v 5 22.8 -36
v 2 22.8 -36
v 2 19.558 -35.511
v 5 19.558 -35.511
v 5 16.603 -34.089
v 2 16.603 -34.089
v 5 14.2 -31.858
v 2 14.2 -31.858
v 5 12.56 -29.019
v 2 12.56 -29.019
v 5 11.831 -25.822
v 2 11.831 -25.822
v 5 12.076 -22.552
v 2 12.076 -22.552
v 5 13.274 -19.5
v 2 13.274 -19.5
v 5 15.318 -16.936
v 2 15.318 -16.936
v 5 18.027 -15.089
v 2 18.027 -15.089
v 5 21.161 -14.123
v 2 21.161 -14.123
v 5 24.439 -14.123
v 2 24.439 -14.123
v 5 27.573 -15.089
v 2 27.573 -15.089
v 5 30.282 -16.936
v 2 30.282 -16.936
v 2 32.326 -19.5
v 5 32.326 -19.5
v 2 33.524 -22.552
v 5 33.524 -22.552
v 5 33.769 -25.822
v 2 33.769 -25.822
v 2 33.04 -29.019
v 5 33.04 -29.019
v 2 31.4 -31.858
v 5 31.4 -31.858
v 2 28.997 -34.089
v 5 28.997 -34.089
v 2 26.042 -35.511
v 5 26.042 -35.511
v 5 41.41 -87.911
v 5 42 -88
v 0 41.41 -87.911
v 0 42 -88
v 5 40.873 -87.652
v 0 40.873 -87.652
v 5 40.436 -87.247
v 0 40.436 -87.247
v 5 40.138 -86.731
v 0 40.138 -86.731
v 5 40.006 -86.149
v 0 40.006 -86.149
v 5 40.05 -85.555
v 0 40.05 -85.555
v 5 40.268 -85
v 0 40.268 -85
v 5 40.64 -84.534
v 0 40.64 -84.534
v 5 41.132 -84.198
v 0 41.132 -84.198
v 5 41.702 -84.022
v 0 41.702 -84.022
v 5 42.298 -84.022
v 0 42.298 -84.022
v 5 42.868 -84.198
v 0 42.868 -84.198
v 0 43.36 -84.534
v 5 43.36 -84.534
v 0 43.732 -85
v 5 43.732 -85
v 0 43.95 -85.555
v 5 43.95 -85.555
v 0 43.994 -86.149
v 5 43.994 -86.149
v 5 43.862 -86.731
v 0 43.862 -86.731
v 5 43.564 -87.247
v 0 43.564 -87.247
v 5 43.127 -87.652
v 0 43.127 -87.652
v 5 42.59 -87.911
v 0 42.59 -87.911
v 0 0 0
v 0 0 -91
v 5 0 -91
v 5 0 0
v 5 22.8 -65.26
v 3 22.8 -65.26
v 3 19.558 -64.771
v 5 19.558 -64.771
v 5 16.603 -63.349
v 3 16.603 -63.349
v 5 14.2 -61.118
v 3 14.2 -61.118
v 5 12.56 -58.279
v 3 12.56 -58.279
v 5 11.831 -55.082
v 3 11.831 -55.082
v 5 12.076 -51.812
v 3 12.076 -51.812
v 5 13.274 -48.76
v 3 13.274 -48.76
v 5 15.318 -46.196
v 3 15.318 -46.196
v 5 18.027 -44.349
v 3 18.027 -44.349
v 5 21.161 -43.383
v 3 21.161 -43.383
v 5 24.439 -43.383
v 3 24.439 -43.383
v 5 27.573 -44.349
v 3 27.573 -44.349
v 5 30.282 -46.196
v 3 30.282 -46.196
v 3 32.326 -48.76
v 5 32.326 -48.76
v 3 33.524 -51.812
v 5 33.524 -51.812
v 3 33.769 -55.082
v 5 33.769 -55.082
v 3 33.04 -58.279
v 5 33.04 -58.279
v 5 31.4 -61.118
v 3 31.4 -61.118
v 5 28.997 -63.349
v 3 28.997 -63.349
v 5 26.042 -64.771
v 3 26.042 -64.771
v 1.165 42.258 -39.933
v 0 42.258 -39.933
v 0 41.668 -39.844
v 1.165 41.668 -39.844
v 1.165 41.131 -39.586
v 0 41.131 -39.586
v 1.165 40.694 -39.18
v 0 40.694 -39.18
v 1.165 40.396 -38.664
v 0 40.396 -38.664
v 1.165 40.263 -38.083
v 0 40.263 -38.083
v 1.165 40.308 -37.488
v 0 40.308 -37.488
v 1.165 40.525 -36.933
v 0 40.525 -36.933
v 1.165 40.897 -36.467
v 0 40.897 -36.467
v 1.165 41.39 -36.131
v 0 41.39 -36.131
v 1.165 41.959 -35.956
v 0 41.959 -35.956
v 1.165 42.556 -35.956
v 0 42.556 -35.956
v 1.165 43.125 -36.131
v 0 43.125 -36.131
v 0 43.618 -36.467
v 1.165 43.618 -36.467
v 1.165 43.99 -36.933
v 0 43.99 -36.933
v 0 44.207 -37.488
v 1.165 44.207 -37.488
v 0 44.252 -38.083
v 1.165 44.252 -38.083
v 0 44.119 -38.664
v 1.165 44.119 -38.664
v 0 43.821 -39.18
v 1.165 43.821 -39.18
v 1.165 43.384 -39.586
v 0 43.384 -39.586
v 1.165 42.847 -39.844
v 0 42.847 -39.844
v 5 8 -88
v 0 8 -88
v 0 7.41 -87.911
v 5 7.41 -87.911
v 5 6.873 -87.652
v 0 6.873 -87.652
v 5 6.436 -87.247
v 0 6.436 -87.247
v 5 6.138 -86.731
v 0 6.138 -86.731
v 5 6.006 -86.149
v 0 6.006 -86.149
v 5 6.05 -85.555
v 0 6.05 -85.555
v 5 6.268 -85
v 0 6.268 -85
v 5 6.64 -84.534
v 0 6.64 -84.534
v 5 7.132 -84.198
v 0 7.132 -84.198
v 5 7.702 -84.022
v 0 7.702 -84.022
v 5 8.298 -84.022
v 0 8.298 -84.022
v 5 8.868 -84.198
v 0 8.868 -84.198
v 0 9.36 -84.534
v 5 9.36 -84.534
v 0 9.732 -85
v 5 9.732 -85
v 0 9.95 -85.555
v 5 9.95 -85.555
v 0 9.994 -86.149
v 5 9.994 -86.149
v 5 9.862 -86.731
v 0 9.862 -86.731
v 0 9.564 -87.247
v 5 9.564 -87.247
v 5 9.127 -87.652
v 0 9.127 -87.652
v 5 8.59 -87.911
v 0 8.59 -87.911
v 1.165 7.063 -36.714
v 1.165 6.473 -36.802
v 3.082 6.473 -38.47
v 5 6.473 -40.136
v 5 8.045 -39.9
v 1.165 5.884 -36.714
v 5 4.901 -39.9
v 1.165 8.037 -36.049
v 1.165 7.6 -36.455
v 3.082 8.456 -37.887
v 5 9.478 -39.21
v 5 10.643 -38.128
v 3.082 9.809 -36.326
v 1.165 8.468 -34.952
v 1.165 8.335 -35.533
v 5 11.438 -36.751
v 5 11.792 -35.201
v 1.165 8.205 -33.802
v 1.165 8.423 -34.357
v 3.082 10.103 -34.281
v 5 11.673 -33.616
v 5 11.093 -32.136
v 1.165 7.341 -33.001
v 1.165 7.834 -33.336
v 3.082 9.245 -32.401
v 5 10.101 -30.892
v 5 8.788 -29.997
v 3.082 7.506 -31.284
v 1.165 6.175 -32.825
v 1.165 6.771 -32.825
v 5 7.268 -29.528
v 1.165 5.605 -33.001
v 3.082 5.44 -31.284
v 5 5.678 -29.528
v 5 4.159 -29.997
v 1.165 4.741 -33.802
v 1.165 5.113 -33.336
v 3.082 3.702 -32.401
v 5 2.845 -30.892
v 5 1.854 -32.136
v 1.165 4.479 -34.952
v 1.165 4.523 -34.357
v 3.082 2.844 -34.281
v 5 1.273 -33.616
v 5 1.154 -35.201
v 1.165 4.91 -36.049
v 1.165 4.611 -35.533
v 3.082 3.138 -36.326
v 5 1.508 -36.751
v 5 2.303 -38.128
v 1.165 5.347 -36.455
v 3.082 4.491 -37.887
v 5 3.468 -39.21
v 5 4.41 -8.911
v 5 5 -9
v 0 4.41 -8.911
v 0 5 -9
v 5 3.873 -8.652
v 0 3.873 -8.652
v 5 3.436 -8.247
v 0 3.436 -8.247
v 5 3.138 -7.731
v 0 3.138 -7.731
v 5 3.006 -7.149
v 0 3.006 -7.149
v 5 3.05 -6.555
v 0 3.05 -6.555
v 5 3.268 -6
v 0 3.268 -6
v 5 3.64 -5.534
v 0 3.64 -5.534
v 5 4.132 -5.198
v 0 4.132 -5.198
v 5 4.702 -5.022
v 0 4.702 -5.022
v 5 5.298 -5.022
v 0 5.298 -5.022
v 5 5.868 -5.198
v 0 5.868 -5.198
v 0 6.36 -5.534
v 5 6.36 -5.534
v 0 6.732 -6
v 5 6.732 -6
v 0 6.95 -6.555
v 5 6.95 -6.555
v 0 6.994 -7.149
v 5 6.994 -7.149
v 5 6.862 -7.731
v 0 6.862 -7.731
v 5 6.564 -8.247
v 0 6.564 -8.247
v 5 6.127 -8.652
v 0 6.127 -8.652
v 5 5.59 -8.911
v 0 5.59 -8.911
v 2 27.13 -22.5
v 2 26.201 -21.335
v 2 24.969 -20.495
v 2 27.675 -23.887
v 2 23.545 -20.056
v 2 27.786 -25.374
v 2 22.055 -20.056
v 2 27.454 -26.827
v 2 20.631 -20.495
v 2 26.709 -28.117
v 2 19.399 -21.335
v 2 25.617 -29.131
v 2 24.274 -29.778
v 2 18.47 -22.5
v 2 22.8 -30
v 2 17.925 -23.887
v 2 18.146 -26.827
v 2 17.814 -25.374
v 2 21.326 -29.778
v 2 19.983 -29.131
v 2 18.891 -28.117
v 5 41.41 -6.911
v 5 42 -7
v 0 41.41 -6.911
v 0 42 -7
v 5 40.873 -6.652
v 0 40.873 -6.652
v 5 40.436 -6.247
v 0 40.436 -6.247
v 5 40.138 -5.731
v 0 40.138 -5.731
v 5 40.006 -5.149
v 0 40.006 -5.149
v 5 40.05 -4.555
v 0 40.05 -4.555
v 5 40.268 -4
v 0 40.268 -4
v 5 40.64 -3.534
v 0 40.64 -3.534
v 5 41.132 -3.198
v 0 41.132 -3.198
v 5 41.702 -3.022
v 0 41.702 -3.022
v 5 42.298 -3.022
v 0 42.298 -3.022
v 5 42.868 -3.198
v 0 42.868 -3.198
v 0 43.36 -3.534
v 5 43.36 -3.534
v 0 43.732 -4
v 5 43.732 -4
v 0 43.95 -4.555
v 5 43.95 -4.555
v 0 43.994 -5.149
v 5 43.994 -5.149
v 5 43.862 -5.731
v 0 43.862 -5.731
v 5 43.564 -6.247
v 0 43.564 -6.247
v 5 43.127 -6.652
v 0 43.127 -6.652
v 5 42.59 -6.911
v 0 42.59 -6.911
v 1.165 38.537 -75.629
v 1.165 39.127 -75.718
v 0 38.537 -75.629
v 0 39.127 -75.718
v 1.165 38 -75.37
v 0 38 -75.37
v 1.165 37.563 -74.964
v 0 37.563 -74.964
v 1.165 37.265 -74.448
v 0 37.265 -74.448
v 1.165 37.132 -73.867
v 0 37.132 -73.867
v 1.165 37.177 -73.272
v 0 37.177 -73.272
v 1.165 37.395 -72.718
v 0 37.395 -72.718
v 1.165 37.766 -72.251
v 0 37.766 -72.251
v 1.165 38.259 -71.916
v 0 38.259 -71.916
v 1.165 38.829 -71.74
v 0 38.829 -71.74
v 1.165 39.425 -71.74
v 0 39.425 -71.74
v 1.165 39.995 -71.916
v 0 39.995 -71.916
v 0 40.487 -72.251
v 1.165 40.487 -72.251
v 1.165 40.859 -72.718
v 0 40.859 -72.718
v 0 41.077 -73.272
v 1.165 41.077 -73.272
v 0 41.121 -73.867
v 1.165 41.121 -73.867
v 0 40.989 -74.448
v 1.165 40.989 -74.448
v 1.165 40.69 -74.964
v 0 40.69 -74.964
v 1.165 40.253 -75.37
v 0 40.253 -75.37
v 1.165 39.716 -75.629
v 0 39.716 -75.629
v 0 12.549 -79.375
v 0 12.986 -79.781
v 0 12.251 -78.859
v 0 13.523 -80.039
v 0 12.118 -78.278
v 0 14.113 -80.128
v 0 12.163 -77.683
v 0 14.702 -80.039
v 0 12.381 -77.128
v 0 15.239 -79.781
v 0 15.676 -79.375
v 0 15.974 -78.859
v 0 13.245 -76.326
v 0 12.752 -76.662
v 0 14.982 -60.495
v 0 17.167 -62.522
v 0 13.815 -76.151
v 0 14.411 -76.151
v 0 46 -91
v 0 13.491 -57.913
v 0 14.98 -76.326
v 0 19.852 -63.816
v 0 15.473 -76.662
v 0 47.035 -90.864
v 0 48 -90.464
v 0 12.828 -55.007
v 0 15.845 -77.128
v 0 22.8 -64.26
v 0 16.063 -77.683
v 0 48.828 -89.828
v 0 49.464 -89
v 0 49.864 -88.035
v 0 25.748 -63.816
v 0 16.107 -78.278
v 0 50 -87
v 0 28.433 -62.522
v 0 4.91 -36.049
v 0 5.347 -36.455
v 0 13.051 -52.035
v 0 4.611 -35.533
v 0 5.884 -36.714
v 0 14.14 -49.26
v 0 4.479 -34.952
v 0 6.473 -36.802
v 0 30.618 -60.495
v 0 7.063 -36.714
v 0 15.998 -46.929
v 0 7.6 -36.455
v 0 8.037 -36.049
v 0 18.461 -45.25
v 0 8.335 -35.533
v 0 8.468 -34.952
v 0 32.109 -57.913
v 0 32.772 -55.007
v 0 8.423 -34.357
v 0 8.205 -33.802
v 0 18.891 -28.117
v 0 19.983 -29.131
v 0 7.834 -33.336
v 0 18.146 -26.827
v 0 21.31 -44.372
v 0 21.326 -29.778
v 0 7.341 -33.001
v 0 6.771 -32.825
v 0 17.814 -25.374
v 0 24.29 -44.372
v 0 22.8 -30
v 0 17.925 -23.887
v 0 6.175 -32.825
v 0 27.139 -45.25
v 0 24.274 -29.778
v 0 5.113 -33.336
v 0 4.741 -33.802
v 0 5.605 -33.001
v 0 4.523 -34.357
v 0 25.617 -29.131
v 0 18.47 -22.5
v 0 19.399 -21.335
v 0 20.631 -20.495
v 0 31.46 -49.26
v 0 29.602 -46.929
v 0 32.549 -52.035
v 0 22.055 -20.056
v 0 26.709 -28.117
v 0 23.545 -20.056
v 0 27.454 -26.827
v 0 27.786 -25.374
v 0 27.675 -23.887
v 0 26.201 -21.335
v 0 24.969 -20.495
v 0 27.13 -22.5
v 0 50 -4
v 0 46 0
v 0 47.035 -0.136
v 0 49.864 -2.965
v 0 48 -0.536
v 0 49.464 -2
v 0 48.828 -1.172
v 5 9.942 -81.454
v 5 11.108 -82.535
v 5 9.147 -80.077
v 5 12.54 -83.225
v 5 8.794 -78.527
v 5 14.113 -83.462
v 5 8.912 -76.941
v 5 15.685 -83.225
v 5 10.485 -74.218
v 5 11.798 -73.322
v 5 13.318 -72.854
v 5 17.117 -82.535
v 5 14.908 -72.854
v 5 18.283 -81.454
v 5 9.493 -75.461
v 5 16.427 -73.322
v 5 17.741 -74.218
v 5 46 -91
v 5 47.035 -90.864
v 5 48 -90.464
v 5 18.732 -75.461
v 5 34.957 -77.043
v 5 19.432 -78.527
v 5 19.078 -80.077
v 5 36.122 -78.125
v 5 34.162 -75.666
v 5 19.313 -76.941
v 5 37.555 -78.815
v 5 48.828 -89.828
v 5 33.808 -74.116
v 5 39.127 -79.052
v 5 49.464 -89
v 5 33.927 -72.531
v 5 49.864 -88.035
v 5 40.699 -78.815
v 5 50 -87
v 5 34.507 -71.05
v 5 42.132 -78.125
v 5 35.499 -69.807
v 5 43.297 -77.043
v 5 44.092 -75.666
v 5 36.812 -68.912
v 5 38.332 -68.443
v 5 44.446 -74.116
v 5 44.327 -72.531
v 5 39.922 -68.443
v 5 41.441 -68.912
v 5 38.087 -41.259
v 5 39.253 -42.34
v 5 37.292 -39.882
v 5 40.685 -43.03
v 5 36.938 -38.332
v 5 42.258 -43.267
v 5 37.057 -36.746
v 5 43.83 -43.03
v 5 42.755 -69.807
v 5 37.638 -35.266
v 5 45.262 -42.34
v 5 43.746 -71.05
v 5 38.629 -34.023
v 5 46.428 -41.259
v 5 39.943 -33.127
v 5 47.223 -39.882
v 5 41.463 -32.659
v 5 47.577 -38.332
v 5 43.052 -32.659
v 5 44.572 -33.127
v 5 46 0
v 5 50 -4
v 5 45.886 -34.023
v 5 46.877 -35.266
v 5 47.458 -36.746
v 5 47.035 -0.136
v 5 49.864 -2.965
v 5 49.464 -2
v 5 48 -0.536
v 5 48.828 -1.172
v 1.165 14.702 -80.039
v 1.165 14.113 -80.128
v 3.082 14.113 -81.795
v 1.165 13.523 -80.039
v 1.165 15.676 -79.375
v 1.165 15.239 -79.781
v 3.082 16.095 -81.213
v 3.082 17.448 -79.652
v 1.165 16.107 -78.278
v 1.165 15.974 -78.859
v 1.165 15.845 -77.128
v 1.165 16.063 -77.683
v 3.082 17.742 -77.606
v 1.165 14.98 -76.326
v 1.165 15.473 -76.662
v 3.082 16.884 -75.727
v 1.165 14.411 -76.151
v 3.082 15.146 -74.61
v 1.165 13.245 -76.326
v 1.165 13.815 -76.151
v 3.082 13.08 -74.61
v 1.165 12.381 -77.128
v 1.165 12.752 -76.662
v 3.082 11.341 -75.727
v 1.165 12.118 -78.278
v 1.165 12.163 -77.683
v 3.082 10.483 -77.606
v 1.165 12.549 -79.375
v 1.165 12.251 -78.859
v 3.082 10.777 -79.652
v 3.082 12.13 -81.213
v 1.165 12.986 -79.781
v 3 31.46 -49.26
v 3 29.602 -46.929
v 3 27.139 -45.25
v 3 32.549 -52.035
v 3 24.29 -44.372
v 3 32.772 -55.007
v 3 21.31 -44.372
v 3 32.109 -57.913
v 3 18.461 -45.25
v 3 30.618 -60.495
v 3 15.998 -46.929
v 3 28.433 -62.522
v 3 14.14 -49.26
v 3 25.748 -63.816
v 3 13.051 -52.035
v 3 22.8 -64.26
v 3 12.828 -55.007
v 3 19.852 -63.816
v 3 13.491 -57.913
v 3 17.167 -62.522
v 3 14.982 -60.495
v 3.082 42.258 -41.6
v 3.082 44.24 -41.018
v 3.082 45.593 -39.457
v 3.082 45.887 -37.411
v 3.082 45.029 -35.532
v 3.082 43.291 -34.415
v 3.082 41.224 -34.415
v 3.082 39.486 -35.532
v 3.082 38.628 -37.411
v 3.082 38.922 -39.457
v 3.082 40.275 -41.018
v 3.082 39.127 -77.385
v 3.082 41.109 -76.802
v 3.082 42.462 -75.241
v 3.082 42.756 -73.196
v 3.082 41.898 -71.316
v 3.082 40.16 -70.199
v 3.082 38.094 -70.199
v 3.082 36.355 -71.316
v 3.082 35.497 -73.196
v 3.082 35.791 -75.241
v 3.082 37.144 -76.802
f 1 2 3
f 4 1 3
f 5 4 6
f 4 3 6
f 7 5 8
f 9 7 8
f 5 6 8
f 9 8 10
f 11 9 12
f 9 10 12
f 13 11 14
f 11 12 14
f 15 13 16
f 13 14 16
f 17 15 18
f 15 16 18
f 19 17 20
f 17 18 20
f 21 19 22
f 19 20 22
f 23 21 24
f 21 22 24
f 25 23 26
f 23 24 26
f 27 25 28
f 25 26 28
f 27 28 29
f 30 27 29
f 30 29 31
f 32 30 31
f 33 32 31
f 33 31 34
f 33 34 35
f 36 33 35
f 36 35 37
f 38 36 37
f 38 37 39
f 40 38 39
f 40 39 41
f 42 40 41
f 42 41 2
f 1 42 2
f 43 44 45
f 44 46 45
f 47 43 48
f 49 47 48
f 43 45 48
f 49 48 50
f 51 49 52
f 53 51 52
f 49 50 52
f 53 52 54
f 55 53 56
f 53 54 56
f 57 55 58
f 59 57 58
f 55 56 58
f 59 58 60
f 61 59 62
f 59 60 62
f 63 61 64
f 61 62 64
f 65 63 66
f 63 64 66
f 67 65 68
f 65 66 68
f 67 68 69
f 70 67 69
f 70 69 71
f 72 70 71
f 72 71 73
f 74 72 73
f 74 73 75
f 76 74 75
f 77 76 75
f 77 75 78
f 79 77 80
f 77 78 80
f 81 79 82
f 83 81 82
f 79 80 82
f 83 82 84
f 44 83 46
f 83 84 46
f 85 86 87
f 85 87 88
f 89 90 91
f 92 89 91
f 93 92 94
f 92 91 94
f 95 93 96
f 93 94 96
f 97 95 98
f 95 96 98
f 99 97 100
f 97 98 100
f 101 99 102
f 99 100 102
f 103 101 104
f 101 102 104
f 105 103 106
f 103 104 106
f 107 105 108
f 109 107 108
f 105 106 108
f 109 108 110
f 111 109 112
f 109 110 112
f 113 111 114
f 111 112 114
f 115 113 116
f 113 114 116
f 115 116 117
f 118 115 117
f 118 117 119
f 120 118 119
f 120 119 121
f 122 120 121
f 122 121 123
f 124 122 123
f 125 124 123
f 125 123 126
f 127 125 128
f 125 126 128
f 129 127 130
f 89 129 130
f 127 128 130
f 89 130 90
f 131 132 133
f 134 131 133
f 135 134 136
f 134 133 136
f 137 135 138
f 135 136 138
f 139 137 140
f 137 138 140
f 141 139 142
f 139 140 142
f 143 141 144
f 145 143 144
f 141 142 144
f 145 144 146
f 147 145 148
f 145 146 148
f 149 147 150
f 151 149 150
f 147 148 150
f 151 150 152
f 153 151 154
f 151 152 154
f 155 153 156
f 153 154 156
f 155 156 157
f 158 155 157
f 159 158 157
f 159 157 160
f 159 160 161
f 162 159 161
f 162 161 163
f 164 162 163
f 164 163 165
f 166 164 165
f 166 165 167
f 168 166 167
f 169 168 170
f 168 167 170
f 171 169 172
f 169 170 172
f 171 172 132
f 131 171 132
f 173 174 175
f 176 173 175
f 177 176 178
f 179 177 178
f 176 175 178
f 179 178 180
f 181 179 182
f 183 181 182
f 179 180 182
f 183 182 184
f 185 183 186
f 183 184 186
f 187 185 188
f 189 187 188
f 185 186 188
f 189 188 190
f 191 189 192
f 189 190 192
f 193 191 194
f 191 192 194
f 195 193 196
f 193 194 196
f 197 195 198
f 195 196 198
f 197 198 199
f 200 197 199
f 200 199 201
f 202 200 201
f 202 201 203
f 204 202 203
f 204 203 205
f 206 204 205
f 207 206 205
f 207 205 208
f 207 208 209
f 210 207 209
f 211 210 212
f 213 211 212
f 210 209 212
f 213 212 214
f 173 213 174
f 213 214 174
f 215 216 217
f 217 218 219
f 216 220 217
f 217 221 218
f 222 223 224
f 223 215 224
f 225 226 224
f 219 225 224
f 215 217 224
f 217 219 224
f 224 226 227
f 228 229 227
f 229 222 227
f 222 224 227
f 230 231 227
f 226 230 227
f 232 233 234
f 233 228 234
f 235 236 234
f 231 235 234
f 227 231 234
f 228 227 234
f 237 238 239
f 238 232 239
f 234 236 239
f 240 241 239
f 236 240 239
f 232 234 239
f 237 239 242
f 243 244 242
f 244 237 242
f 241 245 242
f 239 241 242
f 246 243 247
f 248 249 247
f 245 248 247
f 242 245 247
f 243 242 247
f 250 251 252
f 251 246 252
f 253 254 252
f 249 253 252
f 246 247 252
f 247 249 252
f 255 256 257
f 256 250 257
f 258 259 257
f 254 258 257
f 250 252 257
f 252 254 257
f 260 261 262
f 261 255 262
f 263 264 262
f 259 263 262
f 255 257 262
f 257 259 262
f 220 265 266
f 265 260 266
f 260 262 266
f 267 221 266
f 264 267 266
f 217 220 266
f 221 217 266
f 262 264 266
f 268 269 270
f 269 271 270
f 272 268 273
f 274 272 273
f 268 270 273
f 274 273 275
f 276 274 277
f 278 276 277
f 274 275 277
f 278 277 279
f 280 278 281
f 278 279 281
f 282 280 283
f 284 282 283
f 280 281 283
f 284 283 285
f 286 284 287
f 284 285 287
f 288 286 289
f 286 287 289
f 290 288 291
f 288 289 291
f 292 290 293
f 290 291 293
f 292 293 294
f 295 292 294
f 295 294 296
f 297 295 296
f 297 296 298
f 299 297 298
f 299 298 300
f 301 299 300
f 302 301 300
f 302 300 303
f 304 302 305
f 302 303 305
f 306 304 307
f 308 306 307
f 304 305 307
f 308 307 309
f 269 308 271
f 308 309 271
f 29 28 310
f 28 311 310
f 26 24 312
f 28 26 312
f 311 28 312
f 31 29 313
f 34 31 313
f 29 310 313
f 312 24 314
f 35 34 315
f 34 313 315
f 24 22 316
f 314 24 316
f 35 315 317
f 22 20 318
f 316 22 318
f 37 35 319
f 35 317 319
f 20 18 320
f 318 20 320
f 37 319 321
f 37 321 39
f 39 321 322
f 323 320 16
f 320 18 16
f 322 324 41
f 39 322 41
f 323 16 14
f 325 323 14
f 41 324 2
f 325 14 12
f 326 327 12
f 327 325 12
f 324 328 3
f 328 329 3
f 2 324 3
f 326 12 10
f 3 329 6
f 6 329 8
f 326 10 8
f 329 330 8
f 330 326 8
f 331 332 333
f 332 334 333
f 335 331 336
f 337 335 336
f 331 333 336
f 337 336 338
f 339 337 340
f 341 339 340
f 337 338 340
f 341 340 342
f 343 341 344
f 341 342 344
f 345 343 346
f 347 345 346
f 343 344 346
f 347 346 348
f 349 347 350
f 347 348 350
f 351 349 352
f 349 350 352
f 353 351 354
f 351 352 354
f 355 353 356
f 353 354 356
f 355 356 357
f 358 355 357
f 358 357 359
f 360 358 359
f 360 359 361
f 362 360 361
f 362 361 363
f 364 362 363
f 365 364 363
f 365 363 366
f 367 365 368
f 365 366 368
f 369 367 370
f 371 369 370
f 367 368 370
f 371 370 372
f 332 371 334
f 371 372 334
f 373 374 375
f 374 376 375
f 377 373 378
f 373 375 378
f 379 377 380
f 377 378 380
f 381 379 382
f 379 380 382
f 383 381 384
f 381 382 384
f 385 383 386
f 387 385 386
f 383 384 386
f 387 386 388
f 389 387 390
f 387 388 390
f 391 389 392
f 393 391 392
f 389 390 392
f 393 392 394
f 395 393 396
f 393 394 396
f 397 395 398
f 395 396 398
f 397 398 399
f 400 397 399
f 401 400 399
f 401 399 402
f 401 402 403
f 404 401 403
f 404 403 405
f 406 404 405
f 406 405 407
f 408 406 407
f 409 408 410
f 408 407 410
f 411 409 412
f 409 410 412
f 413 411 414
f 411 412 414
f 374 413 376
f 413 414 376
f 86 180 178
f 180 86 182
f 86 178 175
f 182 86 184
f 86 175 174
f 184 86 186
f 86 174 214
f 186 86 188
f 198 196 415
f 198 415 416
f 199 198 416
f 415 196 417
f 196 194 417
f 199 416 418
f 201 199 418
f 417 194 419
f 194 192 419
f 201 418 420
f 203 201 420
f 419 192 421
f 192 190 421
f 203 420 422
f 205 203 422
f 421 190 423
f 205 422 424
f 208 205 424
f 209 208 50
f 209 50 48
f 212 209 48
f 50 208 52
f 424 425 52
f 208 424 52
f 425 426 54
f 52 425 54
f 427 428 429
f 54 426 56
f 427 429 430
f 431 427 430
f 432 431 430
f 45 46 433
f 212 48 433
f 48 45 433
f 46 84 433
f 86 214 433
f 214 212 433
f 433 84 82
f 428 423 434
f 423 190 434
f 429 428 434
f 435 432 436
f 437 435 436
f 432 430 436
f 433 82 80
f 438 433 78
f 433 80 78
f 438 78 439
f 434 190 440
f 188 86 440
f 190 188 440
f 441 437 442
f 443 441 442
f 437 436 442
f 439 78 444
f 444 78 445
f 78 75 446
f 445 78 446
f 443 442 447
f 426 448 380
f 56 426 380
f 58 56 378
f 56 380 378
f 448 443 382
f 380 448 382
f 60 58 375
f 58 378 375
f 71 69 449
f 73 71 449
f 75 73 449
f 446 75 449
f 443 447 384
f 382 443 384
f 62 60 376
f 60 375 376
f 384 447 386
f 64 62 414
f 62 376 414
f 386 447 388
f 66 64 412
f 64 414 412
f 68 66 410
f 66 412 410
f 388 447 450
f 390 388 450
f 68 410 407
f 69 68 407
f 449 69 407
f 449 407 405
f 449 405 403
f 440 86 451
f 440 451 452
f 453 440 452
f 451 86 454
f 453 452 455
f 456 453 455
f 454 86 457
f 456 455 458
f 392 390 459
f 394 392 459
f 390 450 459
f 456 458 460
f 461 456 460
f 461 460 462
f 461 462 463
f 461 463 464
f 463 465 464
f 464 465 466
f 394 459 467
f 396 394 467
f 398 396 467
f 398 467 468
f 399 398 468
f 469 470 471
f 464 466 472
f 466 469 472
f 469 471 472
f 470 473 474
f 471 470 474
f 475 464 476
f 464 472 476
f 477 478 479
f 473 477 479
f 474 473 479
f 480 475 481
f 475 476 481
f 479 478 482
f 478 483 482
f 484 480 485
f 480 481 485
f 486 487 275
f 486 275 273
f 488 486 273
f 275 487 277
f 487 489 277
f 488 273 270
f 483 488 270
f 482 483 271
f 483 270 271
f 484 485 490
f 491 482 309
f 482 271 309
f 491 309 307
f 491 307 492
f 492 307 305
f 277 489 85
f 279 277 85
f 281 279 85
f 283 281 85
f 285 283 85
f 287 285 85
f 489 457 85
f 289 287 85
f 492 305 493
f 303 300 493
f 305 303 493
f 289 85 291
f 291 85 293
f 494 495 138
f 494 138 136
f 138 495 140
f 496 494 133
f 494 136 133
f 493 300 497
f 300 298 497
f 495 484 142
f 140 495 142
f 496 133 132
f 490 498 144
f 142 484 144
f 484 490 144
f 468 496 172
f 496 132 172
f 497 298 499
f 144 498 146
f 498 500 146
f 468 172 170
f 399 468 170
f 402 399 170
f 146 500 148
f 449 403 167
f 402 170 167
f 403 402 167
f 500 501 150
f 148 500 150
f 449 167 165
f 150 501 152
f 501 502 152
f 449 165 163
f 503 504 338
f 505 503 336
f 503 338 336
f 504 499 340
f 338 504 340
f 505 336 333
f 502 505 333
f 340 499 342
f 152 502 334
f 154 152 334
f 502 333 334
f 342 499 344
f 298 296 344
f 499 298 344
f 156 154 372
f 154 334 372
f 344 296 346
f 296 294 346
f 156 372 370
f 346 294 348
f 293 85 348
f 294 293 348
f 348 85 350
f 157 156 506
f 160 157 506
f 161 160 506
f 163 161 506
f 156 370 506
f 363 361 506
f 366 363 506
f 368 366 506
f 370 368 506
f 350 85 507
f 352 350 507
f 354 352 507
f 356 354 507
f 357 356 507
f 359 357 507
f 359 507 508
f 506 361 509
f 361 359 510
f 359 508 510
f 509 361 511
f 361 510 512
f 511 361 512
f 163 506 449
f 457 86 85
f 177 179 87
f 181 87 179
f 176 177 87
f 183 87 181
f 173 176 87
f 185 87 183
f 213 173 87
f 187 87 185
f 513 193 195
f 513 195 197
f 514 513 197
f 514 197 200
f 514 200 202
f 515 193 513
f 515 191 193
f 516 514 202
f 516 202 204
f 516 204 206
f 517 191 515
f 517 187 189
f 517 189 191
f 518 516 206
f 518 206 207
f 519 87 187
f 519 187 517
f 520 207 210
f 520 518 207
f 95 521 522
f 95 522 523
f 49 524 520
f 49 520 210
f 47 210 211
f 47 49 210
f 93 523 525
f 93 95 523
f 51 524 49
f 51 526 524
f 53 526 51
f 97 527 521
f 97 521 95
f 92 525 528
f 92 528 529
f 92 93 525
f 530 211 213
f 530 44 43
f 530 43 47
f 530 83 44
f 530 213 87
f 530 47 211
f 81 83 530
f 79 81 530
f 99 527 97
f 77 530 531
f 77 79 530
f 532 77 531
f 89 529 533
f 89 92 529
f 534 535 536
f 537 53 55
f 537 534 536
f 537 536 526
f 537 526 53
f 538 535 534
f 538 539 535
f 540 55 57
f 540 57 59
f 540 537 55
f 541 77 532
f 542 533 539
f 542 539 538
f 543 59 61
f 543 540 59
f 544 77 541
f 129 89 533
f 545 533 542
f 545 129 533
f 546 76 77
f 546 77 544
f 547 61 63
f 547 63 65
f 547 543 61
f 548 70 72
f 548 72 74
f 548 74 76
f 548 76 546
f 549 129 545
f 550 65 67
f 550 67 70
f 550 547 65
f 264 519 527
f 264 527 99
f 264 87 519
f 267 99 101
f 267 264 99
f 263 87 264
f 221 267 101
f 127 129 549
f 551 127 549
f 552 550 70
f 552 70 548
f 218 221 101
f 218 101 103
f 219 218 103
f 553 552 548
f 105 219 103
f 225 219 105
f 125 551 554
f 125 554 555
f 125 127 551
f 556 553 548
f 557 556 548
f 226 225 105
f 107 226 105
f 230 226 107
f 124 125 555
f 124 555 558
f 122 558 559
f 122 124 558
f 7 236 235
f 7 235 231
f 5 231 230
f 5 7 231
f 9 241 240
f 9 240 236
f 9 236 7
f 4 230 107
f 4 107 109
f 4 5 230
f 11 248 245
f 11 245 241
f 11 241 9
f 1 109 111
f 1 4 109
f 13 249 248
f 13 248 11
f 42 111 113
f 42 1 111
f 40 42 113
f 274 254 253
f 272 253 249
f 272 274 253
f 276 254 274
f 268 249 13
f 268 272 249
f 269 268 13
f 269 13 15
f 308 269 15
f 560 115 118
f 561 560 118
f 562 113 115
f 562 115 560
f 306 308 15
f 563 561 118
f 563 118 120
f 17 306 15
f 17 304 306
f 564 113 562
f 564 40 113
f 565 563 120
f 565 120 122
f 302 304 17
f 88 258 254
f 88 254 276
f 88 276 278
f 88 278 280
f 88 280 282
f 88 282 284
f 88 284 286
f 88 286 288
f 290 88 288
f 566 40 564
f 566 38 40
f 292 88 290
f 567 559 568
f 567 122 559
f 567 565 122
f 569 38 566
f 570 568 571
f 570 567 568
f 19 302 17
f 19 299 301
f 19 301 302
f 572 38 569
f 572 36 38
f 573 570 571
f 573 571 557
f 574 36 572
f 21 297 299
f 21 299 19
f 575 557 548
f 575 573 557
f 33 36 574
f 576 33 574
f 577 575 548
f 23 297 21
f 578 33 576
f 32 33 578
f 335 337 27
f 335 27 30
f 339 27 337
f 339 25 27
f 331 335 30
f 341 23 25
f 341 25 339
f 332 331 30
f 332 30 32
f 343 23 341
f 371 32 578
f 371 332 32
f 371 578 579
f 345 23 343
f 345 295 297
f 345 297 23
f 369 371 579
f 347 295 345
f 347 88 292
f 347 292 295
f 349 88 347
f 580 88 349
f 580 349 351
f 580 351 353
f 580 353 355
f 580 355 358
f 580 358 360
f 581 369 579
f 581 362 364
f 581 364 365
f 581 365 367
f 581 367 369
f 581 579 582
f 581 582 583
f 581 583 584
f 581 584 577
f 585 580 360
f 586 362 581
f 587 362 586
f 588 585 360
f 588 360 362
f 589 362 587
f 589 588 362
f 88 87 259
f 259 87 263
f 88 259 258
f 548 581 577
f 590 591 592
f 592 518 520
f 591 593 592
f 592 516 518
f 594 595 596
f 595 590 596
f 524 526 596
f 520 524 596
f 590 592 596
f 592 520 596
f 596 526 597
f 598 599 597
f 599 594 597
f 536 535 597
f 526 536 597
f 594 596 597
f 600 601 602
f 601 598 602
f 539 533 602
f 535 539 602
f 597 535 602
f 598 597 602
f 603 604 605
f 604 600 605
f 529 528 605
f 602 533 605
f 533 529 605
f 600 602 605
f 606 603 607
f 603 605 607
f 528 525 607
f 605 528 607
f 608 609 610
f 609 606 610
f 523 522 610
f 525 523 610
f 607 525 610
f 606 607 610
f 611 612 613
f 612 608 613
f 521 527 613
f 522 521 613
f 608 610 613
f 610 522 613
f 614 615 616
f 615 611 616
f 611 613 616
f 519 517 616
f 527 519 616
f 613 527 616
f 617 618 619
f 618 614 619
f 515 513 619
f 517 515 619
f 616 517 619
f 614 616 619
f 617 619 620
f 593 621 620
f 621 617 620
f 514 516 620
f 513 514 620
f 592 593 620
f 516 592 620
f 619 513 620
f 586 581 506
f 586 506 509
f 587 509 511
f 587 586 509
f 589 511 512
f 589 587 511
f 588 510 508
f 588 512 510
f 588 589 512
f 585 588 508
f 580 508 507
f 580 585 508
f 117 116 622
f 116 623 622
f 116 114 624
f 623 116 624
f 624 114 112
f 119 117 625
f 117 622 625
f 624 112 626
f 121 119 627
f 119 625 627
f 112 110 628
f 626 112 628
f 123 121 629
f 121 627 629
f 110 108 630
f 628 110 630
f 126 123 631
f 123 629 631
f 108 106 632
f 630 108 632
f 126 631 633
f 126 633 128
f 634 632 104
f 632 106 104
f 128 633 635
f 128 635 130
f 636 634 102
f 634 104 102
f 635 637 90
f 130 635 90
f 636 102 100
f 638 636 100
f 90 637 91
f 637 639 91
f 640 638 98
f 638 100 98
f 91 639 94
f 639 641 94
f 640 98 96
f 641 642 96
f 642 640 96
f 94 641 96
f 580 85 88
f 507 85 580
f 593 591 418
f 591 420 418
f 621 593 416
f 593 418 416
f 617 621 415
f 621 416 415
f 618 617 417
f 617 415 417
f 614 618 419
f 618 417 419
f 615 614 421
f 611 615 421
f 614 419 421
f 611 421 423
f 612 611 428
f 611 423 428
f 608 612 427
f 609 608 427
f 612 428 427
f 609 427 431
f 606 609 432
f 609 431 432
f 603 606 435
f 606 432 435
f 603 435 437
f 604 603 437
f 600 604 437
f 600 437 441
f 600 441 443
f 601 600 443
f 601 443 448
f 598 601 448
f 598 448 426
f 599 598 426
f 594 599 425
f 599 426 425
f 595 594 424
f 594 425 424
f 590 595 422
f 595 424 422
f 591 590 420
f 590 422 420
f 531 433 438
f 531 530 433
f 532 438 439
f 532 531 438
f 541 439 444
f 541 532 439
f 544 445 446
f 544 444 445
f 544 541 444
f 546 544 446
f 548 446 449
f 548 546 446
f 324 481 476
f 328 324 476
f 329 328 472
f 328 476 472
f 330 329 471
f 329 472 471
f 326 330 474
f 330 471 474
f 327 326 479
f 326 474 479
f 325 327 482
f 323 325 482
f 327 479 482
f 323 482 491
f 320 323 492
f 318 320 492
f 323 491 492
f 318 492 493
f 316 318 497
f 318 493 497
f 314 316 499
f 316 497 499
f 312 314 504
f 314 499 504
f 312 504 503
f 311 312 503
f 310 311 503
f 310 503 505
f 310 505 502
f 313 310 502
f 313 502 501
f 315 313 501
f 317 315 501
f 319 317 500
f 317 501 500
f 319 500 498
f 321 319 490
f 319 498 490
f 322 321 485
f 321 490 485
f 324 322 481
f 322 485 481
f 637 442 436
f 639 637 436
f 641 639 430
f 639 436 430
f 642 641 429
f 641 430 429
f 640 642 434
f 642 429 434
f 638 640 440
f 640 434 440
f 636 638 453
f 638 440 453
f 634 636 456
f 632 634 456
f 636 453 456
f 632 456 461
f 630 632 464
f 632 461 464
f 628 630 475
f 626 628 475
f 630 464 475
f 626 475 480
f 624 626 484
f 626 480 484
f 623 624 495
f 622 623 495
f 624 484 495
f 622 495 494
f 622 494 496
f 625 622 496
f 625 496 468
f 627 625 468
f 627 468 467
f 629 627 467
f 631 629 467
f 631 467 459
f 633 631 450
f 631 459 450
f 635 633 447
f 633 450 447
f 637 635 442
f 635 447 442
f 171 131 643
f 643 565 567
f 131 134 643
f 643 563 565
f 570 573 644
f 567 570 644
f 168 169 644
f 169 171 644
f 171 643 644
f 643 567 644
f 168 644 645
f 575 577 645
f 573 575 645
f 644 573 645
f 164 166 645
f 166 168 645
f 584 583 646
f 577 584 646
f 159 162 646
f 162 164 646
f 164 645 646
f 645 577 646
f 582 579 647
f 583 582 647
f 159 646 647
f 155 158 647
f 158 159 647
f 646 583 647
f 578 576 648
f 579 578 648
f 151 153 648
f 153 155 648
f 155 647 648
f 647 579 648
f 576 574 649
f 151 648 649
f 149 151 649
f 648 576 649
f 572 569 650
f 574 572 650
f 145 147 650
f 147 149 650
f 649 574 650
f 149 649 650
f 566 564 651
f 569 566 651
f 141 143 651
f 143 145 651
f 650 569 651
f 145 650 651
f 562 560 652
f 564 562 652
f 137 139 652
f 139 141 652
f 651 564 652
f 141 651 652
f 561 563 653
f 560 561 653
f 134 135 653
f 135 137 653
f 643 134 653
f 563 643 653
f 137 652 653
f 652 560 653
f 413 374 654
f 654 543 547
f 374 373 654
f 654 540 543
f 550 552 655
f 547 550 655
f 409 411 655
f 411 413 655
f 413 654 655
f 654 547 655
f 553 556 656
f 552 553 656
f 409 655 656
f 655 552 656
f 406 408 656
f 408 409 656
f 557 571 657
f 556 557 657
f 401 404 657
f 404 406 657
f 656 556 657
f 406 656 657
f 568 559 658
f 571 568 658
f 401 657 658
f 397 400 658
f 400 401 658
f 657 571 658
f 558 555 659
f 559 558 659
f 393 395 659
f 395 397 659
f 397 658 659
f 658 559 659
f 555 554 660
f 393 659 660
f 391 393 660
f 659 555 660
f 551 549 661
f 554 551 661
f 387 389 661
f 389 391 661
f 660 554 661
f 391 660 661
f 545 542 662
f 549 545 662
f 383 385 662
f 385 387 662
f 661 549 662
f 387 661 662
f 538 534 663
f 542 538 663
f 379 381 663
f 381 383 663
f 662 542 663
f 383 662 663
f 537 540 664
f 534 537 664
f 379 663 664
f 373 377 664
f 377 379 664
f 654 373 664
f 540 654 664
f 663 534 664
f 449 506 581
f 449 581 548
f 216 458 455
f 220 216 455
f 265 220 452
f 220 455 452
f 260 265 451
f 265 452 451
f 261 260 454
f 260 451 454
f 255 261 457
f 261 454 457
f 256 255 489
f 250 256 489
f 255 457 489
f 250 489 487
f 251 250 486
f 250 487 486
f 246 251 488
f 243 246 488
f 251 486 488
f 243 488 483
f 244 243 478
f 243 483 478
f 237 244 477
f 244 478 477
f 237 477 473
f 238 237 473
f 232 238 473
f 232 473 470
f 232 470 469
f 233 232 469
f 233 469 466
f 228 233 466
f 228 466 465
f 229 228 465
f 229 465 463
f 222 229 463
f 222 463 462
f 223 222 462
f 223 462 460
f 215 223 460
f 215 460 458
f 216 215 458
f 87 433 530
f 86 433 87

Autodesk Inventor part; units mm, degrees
ref_plane "YZ Plane" through (0, 0, 0) normal (1, 0, 0) x (0, 1, 0)
ref_plane "XZ Plane" through (0, 0, 0) normal (0, 1, 0) x (-1, 0, 0)
ref_plane "XY Plane" through (0, 0, 0) normal (0, 0, 1) x (1, 0, 0)
sketch "Sketch1" plane through (0, 0, 0) normal (1, 0, 0) x (0, 1, 0)
  line L0 (0, 0) -> (50, 0)
  line L1 (50, 0) -> (50, -91)
  line L2 (50, -91) -> (0, -91)
  line L3 (0, -91) -> (0, 0)
  dimension "d0" = 50
  dimension "d1" = 91
extrude "Extrusion1" add sketch "Sketch1" along normal blind 5
sketch "Sketch2" plane through (5, 0, 0) normal (1, 0, 0) x (0, 0, -1)
  line L0 (0, 0) -> (91, 0) projected
  line L1 (0, 50) -> (0, 0) projected
  point P0 (25, 22.8)
  dimension "d4" = 22.8
  dimension "d5" = 25
hole "Hole1" at (5, 22.8, -25) direction (-1, 0, 0) diameter 10 end through all counterbore diameter 22 counterbore depth 3
sketch "Sketch3" plane through (5, 0, 0) normal (1, 0, 0) x (0, 0, -1)
  circle A0 centre (25, 22.8) radius 11 projected
  line L0 (91, 0) -> (91, 50) projected
  line L1 (91, 50) -> (0, 50) projected
  line L2 (0, 50) -> (0, 0) projected
  line L3 (0, 0) -> (91, 0) projected
  circle A1 centre (25, 22.8) radius 5 projected
  line L4 (25, 22.8) -> (54.26, 22.8)
  dimension "d13" = 29.26
  dimension "d14" = 0
hole "Hole2" at (5, 22.8, -54.26) direction (-1, 0, 0) diameter 20 end through all counterbore diameter 22 counterbore depth 2
sketch "Sketch4" plane through (5, 0, 0) normal (1, 0, 0) x (0, 0, -1)
  circle A0 centre (54.26, 22.8) radius 11 projected
  line L0 (54.26, 22.8) -> (73.7175, 39.1268)
  line L1 (0, 0) -> (91, 0) projected
  point P0 (49.8493, 47.8141)
  point P1 (30.3918, 31.4873)
  point P2 (34.8025, 6.4732)
  point P3 (58.6707, -2.2141)
  point P4 (78.1282, 14.1127)
  dimension "d22" = 25.4
  dimension "d23" = 40
  dimension "d33" = 360
hole "Falcon Bolt Holes" at (5, 39.1268, -73.7175) at (5, 6.4732, -34.8025) at (5, 14.1127, -78.1282) direction (-1, 0, 0) diameter 4 end through all countersink diameter 10.668 countersink angle 82
fillet "Fillet1" radius 4 2 edges at (2.5, 50, 0) (2.5, 50, -91)
sketch "Sketch8" plane through (5, 0, 0) normal (1, 0, 0) x (0, 0, -1)
  line L0 (87, 50) -> (4, 50) projected
  line L1 (91, 0) -> (91, 46) projected
  line L2 (0, 0) -> (91, 0) projected
  line L3 (0, 46) -> (0, 0) projected
  circle A0 centre (5, 42) radius 4.5
  circle A1 centre (5, 42) radius 2
  circle A2 centre (7, 5) radius 4.5
  circle A3 centre (7, 5) radius 2
  circle A4 centre (86, 42) radius 4.5
  circle A5 centre (86, 42) radius 2
  circle A6 centre (86, 8) radius 4.5
  circle A7 centre (86, 8) radius 2
  dimension "d55" = 8
  dimension "d57" = 5
  dimension "d58" = 8
  dimension "d59" = 7
  dimension "d60" = 5
  dimension "d61" = 5
  dimension "d62" = 8
  dimension "d63" = 9
  dimension "d64" = 4
  dimension "d65" = 9
  dimension "d66" = 4
  dimension "d67" = 9
  dimension "d68" = 4
  dimension "d69" = 9
  dimension "d70" = 4
  dimension "d71" = 5
hole "Hole5" at (5, 42, -5) at (5, 42, -86) at (5, 8, -86) at (5, 5, -7) direction (-1, 0, 0) diameter 4 end through all
sketch "Sketch10" plane through (5, 0, 0) normal (1, 0, 0) x (0, 0, -1)
  circle A0 centre (54.26, 22.8) radius 11 projected
  line L0 (37.9332, 42.2575) -> (73.7175, 39.1268)
  line L1 (73.7175, 39.1268) -> (70.5868, 3.3425)
  line L2 (70.5868, 3.3425) -> (34.8025, 6.4732)
  line L3 (34.8025, 6.4732) -> (37.9332, 42.2575)
  line L4 (54.26, 22.8) -> (37.9332, 42.2575)
  line L5 (0, 46) -> (0, 0) projected
  line L6 (91, 0) -> (91, 46) projected
  line L7 (0, 0) -> (91, 0)
  circle A1 centre (34.8025, 6.4732) radius 2 projected
  dimension "d81" = 25.4
  dimension "d82" = 5
hole "Neo Bolt Holes" at (5, 42.2575, -37.9332) at (5, 39.1268, -73.7175) at (5, 6.4732, -34.8025) direction (-1, 0, 0) diameter 4 end through all countersink diameter 10.668 countersink angle 82
properties part number "One Motor Plate"
